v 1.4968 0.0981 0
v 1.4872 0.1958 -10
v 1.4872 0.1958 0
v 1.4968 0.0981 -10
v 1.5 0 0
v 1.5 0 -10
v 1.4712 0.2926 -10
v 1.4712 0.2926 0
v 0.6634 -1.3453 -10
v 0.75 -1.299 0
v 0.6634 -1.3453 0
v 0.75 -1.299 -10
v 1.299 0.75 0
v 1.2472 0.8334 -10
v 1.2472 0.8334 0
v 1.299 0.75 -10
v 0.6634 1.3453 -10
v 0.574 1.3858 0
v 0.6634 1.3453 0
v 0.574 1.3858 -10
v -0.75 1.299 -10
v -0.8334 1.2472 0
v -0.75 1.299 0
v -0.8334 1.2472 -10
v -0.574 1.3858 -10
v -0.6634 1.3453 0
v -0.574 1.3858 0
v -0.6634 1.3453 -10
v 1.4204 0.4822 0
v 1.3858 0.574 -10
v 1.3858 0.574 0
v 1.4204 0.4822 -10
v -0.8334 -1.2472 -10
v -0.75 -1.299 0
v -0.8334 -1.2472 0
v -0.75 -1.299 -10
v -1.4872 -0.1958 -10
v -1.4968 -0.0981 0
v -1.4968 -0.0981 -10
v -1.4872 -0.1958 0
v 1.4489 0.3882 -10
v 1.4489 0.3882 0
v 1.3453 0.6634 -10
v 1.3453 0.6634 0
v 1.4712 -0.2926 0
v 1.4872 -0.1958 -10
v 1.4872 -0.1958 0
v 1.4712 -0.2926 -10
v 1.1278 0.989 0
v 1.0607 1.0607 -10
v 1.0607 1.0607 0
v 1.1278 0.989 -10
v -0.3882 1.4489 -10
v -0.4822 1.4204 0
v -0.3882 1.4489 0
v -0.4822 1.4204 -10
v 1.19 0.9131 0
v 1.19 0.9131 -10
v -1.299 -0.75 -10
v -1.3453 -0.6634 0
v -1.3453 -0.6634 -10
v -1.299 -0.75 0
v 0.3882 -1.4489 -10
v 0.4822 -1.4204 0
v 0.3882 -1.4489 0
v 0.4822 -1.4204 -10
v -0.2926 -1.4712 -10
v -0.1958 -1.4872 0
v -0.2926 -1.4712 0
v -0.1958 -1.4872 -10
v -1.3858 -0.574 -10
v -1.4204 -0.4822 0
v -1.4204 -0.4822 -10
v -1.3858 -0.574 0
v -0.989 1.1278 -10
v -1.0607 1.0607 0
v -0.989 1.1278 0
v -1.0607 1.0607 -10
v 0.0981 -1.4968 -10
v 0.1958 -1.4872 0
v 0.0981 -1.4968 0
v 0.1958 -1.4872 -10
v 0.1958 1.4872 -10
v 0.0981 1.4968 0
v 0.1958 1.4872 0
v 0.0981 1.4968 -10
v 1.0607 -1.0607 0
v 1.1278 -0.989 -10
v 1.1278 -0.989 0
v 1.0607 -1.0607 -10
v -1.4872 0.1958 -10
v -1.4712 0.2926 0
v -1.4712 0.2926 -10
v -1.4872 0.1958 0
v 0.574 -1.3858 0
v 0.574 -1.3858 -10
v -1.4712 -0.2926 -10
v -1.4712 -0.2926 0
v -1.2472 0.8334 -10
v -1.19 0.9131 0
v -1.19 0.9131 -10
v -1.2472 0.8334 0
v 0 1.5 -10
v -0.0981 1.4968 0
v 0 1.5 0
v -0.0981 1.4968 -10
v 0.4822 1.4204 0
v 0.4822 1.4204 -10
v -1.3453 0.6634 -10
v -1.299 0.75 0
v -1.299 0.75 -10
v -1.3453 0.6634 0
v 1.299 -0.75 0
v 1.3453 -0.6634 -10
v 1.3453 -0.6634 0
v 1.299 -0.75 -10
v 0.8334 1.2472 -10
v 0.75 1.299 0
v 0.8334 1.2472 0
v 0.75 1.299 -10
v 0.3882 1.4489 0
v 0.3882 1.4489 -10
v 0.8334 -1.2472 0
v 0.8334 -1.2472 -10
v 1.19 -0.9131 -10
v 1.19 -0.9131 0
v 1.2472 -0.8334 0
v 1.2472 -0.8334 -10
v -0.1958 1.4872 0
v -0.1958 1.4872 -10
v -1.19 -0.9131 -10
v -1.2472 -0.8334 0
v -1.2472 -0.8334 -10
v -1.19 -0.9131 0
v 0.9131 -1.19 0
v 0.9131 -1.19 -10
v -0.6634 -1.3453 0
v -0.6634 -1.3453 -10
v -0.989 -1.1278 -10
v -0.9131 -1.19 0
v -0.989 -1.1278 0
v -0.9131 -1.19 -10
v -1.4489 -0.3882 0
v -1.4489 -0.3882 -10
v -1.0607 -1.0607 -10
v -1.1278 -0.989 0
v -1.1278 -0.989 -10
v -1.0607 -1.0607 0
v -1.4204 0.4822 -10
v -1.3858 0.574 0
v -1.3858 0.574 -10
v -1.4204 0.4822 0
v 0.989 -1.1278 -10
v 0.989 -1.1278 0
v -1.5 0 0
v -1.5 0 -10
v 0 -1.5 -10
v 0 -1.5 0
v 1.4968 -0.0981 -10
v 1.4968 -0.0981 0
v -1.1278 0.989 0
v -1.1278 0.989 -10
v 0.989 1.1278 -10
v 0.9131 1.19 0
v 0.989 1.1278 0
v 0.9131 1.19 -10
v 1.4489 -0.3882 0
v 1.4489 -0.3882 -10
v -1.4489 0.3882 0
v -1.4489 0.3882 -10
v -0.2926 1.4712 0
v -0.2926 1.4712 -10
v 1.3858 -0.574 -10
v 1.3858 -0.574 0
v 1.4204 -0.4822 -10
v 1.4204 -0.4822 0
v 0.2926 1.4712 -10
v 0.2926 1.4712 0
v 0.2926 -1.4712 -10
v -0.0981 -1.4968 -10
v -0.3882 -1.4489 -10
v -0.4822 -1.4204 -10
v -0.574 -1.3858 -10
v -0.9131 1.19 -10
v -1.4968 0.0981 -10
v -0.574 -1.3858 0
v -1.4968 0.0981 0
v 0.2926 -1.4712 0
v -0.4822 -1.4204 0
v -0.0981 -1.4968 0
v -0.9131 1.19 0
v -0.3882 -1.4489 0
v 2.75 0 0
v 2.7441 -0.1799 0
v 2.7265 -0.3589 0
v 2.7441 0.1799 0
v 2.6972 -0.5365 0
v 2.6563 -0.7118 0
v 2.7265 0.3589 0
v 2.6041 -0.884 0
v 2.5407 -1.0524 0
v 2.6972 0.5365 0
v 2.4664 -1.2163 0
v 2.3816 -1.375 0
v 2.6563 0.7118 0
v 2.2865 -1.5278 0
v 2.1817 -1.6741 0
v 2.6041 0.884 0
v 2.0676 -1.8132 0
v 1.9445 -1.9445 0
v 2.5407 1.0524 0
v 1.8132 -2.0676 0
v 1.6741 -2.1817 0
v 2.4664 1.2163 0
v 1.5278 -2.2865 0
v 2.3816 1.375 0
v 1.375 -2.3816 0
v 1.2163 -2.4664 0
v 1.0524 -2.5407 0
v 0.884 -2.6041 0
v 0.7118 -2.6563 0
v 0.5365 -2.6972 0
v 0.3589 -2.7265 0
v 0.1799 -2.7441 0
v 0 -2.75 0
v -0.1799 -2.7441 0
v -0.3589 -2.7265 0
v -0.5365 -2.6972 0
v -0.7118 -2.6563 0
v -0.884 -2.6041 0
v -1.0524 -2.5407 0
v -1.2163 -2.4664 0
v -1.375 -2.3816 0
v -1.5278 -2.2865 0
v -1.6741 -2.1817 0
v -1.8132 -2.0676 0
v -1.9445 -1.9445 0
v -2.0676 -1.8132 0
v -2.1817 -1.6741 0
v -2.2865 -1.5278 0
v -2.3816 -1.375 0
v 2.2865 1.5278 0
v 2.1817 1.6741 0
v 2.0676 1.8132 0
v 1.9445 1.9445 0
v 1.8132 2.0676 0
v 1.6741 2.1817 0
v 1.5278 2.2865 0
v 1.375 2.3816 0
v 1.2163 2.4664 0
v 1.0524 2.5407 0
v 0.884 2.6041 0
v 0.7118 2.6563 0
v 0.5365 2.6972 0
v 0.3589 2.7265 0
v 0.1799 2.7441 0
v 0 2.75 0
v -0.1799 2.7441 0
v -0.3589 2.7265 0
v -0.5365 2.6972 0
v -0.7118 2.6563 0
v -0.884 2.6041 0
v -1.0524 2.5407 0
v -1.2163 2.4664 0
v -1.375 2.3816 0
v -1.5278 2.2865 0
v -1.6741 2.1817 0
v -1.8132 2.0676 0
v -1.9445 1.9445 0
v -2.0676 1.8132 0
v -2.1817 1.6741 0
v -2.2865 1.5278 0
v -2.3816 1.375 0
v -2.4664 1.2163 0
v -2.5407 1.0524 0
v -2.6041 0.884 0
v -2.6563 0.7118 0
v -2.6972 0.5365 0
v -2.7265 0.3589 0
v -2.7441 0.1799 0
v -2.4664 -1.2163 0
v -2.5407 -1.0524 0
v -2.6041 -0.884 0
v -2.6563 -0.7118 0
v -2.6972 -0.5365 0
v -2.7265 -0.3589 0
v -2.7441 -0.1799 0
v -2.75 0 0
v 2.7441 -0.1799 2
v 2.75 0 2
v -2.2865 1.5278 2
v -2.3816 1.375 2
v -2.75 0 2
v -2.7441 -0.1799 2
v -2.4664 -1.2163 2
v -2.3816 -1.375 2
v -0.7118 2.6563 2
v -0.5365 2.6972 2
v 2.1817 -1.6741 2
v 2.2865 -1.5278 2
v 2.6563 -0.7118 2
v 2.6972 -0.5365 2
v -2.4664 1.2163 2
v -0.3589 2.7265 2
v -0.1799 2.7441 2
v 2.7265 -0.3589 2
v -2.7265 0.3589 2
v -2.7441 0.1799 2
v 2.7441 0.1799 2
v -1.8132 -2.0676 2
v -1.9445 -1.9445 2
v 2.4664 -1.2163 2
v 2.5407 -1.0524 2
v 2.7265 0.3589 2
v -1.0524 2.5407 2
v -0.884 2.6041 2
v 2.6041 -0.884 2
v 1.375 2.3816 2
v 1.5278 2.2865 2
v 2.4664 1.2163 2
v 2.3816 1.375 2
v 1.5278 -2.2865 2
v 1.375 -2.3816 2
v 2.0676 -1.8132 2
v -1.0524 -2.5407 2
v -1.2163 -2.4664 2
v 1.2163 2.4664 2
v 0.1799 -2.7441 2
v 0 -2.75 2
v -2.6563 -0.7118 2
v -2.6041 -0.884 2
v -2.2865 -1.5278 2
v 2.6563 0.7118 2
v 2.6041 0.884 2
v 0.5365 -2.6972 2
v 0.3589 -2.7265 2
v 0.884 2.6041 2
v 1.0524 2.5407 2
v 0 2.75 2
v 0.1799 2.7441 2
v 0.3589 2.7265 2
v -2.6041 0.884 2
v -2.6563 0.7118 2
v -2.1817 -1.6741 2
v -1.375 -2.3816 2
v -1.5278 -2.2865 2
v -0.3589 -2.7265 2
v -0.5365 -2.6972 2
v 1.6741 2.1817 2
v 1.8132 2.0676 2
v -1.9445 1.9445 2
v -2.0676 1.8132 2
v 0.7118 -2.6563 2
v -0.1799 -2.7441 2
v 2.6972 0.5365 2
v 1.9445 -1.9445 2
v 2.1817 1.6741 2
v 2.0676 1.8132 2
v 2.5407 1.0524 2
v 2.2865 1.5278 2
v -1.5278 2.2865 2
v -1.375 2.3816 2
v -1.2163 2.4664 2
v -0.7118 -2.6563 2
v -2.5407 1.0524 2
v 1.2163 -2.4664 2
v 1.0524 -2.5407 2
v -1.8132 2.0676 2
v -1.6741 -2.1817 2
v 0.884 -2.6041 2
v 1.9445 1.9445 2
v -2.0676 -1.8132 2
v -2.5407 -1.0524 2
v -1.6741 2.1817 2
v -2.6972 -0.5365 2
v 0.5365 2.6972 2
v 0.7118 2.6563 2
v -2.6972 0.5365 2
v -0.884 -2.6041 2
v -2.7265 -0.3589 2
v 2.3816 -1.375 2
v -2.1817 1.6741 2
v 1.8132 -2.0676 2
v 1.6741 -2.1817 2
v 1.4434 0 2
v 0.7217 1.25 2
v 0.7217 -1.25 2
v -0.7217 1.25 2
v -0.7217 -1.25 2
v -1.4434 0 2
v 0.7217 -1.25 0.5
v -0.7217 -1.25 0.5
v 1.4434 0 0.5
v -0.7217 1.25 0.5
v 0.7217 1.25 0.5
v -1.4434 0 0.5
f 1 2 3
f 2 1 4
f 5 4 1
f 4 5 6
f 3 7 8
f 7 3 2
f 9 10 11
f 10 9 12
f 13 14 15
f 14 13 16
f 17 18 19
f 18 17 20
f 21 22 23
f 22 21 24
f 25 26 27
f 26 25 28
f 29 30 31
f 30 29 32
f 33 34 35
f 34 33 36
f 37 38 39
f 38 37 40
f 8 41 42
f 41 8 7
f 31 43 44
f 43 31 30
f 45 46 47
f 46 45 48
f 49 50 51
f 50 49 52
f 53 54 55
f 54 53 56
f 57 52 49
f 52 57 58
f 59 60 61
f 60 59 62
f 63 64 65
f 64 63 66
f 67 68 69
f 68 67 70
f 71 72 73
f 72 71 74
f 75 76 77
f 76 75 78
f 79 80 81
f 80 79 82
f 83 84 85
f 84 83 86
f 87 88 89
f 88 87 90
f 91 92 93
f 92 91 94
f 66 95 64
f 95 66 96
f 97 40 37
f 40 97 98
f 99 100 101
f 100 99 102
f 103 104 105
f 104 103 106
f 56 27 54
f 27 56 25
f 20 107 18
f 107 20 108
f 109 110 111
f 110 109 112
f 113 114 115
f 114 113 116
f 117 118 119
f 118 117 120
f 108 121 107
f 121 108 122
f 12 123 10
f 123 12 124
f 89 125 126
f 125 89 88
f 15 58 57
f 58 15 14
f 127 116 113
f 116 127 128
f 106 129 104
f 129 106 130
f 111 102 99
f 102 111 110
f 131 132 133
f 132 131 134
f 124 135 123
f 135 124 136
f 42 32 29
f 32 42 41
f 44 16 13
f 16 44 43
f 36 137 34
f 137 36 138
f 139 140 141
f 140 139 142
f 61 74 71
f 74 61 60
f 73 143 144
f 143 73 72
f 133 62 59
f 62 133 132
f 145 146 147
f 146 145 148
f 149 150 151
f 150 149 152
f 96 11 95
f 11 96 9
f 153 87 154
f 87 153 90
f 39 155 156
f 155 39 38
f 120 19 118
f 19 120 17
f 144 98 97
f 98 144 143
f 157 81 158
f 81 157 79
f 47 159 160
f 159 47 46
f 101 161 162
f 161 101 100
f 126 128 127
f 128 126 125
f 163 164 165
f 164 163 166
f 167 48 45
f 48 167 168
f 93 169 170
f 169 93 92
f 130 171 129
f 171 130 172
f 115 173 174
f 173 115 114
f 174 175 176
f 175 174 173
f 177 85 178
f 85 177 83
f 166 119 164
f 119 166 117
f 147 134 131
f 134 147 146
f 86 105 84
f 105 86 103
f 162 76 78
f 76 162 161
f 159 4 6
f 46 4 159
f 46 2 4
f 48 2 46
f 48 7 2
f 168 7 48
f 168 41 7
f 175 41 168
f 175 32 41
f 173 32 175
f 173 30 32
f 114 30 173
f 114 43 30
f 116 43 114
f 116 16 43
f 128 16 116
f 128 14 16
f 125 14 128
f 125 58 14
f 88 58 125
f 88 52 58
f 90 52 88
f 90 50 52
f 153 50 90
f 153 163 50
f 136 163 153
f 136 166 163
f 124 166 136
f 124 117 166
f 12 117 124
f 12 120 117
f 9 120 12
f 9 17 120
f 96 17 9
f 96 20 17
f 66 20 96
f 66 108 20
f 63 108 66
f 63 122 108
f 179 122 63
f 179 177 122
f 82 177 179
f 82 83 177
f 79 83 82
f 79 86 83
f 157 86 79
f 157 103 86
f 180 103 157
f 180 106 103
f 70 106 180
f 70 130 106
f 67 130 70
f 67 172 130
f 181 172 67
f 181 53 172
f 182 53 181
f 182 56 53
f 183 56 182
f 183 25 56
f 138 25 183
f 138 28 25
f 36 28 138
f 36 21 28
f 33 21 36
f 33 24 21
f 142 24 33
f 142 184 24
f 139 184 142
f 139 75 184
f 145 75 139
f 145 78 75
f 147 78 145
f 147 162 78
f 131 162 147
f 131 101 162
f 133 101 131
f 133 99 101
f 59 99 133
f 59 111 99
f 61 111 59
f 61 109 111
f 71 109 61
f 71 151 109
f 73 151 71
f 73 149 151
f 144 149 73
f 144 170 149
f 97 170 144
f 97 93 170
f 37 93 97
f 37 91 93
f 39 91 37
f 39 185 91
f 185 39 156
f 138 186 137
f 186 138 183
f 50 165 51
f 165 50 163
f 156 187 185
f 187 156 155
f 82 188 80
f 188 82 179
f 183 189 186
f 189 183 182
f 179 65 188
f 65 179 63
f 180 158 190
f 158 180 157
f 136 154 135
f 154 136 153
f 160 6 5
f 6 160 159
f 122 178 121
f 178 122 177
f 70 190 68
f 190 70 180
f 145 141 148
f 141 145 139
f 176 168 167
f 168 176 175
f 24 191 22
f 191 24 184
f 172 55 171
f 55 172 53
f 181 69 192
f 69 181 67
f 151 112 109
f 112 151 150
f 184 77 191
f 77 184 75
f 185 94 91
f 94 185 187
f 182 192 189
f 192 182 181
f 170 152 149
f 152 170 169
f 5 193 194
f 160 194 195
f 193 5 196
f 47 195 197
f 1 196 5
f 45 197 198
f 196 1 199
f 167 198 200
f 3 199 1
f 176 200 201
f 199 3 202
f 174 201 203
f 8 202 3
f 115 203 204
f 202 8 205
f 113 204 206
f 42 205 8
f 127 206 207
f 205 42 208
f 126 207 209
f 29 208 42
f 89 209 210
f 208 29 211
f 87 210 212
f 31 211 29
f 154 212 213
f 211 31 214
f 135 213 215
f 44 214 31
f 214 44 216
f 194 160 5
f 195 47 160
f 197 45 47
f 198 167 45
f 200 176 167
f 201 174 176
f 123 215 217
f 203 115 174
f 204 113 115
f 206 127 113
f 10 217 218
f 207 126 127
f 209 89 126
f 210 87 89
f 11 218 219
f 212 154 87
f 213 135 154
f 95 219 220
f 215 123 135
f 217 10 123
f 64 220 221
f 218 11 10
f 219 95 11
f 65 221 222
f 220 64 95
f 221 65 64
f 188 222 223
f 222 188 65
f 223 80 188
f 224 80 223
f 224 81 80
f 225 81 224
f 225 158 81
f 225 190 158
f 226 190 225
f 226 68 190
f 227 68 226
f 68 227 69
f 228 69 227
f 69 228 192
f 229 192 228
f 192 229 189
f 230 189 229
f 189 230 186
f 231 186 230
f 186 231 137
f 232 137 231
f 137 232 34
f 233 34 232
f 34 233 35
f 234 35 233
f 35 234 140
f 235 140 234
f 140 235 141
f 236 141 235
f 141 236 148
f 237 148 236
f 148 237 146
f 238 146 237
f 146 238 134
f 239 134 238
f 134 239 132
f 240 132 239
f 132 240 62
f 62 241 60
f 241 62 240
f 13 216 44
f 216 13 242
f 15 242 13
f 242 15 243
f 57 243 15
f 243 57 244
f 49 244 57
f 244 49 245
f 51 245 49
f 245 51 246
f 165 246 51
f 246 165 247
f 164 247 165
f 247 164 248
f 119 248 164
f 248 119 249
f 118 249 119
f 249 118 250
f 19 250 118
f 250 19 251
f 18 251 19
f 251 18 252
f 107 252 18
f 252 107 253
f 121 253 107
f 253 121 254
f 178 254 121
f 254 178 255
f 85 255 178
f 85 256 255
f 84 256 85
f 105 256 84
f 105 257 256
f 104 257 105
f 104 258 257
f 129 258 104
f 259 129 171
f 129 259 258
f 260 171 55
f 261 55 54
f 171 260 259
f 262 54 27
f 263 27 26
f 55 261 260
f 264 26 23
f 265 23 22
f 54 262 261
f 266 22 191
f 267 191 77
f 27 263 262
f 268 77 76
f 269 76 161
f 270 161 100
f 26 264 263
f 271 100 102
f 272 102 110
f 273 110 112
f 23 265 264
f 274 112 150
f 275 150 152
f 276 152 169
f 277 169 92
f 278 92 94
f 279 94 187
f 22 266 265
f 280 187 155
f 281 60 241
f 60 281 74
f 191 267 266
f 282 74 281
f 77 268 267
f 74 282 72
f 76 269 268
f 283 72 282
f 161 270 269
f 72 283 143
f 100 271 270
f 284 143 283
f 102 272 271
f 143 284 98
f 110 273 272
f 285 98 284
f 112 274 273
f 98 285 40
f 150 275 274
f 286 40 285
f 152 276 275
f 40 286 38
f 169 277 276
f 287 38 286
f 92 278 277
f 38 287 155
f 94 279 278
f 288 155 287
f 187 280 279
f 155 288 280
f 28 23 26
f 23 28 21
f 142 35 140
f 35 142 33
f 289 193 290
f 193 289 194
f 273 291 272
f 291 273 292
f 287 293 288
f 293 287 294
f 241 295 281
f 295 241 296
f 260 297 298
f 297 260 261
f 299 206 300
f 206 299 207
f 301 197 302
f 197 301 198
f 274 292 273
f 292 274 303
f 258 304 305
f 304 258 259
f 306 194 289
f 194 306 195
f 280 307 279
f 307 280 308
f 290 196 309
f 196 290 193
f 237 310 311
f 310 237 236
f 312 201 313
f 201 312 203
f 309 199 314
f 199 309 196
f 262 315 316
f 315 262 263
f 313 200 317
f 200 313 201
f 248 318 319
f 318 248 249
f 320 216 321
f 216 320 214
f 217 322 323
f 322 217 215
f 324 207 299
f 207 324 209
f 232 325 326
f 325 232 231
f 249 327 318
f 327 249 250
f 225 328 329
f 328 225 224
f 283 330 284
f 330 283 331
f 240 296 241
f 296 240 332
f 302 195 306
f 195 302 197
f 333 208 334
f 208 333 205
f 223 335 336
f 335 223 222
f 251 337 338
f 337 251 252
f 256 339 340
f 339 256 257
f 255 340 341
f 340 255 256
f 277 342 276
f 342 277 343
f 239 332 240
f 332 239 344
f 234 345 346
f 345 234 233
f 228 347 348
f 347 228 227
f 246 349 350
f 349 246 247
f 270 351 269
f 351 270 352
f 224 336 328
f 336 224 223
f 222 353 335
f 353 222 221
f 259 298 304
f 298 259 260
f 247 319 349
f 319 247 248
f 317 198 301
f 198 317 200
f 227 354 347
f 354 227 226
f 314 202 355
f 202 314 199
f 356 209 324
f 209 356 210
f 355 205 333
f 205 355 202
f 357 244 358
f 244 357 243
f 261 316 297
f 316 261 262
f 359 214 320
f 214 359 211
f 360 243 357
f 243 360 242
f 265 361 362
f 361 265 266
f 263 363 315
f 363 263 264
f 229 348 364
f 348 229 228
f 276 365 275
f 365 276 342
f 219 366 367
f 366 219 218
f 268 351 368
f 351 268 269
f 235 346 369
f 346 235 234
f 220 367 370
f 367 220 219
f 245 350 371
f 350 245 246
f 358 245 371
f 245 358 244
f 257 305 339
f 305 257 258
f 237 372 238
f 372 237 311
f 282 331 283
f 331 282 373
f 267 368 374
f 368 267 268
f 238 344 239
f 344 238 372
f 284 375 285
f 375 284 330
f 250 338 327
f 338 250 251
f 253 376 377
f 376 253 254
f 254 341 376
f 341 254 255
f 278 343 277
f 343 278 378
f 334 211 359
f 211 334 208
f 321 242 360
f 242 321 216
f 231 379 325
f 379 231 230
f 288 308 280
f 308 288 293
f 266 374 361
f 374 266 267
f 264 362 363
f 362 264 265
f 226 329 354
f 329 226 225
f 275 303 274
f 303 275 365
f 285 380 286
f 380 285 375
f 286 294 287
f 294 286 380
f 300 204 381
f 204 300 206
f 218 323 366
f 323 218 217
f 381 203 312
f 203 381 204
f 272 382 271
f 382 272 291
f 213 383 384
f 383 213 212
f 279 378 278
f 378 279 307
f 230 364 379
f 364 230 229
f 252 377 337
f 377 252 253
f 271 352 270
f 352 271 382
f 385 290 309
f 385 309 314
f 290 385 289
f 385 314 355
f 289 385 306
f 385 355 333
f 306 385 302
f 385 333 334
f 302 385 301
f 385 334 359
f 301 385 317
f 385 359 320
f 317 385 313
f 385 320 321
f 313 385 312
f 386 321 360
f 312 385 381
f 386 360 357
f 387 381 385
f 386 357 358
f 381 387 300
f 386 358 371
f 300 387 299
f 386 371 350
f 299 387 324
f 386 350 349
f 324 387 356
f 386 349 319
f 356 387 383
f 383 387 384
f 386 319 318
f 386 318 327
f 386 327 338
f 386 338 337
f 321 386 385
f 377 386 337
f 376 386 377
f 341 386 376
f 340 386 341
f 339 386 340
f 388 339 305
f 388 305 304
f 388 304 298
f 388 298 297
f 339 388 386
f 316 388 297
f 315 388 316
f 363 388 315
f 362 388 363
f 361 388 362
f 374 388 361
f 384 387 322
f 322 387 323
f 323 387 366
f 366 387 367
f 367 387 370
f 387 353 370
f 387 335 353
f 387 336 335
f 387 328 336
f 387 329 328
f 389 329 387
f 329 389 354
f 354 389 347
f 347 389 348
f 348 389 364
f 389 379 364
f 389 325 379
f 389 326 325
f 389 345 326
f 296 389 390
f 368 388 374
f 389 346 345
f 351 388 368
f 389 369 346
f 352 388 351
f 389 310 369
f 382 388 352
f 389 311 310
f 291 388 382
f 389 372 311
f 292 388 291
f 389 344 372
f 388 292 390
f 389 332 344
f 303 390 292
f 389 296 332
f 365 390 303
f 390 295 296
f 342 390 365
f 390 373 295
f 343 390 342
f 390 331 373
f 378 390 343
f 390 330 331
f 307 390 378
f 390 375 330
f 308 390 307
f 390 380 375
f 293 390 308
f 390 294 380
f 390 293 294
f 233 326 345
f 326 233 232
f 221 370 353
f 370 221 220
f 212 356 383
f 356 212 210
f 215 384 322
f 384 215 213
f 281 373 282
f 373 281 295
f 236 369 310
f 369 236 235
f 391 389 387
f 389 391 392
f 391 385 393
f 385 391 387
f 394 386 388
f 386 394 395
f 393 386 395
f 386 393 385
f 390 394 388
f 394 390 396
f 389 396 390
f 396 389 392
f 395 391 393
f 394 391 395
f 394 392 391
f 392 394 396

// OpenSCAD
$fn = 96;

d_shaft = 3.0;
L = 10.0;

d_head = 5.5;
h_head = 2.0;

hex_flat = 2.5;          // approximate for M3 socket
hex_depth = 1.5;         // approximate socket depth
chamfer = 0.25;

module socket_head_cap_screw() {
    difference() {
        union() {
            // Shaft
            translate([0,0,-L])
                cylinder(d=d_shaft, h=L);

            // Head (slight top chamfer)
            cylinder(d=d_head, h=h_head);
            translate([0,0,h_head - chamfer])
                cylinder(d1=d_head, d2=d_head - 2*chamfer, h=chamfer);
        }

        // Hex socket
        translate([0,0,h_head - hex_depth])
            cylinder(h=hex_depth + 0.02, d=hex_flat / cos(30), $fn=6);
    }
}

socket_head_cap_screw();
